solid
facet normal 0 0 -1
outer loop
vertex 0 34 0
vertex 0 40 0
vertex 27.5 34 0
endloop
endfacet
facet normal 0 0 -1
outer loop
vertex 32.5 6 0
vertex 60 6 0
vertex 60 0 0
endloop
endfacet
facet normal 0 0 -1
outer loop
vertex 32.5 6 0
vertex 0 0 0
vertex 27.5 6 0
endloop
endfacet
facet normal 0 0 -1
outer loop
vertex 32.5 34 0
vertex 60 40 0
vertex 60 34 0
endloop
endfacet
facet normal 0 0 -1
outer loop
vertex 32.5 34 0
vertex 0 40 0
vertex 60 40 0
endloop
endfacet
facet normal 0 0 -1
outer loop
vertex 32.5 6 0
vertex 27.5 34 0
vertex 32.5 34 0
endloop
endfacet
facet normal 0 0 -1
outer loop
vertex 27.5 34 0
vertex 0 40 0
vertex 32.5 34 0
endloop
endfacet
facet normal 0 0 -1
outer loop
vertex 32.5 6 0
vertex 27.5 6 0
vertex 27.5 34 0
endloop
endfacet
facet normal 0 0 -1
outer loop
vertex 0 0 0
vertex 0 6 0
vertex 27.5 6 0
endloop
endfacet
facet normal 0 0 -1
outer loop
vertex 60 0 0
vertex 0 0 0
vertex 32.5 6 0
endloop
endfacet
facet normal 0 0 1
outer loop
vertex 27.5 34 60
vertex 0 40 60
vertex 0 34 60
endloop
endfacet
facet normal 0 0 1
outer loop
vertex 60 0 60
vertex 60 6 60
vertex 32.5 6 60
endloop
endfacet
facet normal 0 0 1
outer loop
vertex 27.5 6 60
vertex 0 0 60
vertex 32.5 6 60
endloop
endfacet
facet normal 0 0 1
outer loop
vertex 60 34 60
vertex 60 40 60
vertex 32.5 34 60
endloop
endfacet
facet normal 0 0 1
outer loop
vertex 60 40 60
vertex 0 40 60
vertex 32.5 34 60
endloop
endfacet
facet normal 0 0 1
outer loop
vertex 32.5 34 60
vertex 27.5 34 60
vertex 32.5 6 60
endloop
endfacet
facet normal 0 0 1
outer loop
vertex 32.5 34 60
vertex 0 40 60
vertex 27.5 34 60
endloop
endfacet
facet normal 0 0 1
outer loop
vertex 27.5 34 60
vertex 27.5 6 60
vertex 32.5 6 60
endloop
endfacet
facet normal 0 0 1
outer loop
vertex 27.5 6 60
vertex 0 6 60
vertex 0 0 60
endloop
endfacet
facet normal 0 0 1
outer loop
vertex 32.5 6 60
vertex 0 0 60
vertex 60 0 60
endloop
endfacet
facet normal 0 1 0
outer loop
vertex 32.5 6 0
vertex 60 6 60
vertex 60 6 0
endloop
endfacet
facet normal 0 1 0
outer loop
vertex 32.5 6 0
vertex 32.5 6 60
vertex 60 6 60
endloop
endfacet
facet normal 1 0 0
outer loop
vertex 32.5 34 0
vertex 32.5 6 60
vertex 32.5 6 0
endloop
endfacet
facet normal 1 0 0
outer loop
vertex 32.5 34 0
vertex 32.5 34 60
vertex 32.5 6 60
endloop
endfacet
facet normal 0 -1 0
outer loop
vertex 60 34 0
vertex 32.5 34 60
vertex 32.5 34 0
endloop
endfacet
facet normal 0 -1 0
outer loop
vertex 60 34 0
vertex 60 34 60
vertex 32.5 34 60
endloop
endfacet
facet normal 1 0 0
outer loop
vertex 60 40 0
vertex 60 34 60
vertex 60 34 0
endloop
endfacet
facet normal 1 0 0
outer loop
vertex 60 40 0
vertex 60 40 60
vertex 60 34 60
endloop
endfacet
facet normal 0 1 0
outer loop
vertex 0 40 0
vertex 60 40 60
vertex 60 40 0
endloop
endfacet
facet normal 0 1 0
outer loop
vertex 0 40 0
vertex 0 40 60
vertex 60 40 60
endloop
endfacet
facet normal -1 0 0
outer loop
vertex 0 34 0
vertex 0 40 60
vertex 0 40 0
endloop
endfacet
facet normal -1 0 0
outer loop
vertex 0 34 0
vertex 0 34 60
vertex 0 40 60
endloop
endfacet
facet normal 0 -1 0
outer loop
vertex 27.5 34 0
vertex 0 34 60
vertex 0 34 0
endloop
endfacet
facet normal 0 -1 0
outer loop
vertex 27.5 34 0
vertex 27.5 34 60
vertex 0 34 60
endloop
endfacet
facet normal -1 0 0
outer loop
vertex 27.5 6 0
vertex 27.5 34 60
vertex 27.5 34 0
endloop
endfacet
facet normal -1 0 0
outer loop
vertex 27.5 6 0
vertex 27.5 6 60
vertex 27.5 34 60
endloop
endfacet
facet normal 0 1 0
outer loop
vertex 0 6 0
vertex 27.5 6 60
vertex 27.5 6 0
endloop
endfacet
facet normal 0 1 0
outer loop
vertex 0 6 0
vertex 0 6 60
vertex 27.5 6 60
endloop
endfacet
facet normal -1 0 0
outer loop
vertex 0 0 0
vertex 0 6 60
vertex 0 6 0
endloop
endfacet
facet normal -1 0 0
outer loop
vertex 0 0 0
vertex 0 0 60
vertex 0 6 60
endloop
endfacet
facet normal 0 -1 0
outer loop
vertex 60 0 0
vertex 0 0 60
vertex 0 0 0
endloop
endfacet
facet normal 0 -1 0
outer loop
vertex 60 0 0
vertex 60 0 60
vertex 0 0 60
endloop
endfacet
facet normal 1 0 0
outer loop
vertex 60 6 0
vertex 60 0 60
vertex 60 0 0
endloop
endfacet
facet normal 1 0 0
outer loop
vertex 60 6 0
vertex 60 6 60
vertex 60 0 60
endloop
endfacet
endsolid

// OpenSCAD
$fn = 32;

// ----------------------------------------------------------------------
// Structural section: ibeam 60 x 40 mm
// ----------------------------------------------------------------------

// --- parameters (mm) ---
sec_w = 60;               // section width, X
sec_h = 40;               // section height, Y
flange_t = 6;             // flange thickness
web_t = 5;                // web thickness
plate_t = 60;             // cut length, Z (extrusion height)

profile = [[0, 0], [60, 0], [60, 6], [32.5, 6], [32.5, 34], [60, 34], [60, 40], [0, 40], [0, 34], [27.5, 34], [27.5, 6], [0, 6]];  // primary outline, 12 points, counter clockwise

// --- the one profile operation ---
linear_extrude(height = plate_t) polygon(points = profile);
